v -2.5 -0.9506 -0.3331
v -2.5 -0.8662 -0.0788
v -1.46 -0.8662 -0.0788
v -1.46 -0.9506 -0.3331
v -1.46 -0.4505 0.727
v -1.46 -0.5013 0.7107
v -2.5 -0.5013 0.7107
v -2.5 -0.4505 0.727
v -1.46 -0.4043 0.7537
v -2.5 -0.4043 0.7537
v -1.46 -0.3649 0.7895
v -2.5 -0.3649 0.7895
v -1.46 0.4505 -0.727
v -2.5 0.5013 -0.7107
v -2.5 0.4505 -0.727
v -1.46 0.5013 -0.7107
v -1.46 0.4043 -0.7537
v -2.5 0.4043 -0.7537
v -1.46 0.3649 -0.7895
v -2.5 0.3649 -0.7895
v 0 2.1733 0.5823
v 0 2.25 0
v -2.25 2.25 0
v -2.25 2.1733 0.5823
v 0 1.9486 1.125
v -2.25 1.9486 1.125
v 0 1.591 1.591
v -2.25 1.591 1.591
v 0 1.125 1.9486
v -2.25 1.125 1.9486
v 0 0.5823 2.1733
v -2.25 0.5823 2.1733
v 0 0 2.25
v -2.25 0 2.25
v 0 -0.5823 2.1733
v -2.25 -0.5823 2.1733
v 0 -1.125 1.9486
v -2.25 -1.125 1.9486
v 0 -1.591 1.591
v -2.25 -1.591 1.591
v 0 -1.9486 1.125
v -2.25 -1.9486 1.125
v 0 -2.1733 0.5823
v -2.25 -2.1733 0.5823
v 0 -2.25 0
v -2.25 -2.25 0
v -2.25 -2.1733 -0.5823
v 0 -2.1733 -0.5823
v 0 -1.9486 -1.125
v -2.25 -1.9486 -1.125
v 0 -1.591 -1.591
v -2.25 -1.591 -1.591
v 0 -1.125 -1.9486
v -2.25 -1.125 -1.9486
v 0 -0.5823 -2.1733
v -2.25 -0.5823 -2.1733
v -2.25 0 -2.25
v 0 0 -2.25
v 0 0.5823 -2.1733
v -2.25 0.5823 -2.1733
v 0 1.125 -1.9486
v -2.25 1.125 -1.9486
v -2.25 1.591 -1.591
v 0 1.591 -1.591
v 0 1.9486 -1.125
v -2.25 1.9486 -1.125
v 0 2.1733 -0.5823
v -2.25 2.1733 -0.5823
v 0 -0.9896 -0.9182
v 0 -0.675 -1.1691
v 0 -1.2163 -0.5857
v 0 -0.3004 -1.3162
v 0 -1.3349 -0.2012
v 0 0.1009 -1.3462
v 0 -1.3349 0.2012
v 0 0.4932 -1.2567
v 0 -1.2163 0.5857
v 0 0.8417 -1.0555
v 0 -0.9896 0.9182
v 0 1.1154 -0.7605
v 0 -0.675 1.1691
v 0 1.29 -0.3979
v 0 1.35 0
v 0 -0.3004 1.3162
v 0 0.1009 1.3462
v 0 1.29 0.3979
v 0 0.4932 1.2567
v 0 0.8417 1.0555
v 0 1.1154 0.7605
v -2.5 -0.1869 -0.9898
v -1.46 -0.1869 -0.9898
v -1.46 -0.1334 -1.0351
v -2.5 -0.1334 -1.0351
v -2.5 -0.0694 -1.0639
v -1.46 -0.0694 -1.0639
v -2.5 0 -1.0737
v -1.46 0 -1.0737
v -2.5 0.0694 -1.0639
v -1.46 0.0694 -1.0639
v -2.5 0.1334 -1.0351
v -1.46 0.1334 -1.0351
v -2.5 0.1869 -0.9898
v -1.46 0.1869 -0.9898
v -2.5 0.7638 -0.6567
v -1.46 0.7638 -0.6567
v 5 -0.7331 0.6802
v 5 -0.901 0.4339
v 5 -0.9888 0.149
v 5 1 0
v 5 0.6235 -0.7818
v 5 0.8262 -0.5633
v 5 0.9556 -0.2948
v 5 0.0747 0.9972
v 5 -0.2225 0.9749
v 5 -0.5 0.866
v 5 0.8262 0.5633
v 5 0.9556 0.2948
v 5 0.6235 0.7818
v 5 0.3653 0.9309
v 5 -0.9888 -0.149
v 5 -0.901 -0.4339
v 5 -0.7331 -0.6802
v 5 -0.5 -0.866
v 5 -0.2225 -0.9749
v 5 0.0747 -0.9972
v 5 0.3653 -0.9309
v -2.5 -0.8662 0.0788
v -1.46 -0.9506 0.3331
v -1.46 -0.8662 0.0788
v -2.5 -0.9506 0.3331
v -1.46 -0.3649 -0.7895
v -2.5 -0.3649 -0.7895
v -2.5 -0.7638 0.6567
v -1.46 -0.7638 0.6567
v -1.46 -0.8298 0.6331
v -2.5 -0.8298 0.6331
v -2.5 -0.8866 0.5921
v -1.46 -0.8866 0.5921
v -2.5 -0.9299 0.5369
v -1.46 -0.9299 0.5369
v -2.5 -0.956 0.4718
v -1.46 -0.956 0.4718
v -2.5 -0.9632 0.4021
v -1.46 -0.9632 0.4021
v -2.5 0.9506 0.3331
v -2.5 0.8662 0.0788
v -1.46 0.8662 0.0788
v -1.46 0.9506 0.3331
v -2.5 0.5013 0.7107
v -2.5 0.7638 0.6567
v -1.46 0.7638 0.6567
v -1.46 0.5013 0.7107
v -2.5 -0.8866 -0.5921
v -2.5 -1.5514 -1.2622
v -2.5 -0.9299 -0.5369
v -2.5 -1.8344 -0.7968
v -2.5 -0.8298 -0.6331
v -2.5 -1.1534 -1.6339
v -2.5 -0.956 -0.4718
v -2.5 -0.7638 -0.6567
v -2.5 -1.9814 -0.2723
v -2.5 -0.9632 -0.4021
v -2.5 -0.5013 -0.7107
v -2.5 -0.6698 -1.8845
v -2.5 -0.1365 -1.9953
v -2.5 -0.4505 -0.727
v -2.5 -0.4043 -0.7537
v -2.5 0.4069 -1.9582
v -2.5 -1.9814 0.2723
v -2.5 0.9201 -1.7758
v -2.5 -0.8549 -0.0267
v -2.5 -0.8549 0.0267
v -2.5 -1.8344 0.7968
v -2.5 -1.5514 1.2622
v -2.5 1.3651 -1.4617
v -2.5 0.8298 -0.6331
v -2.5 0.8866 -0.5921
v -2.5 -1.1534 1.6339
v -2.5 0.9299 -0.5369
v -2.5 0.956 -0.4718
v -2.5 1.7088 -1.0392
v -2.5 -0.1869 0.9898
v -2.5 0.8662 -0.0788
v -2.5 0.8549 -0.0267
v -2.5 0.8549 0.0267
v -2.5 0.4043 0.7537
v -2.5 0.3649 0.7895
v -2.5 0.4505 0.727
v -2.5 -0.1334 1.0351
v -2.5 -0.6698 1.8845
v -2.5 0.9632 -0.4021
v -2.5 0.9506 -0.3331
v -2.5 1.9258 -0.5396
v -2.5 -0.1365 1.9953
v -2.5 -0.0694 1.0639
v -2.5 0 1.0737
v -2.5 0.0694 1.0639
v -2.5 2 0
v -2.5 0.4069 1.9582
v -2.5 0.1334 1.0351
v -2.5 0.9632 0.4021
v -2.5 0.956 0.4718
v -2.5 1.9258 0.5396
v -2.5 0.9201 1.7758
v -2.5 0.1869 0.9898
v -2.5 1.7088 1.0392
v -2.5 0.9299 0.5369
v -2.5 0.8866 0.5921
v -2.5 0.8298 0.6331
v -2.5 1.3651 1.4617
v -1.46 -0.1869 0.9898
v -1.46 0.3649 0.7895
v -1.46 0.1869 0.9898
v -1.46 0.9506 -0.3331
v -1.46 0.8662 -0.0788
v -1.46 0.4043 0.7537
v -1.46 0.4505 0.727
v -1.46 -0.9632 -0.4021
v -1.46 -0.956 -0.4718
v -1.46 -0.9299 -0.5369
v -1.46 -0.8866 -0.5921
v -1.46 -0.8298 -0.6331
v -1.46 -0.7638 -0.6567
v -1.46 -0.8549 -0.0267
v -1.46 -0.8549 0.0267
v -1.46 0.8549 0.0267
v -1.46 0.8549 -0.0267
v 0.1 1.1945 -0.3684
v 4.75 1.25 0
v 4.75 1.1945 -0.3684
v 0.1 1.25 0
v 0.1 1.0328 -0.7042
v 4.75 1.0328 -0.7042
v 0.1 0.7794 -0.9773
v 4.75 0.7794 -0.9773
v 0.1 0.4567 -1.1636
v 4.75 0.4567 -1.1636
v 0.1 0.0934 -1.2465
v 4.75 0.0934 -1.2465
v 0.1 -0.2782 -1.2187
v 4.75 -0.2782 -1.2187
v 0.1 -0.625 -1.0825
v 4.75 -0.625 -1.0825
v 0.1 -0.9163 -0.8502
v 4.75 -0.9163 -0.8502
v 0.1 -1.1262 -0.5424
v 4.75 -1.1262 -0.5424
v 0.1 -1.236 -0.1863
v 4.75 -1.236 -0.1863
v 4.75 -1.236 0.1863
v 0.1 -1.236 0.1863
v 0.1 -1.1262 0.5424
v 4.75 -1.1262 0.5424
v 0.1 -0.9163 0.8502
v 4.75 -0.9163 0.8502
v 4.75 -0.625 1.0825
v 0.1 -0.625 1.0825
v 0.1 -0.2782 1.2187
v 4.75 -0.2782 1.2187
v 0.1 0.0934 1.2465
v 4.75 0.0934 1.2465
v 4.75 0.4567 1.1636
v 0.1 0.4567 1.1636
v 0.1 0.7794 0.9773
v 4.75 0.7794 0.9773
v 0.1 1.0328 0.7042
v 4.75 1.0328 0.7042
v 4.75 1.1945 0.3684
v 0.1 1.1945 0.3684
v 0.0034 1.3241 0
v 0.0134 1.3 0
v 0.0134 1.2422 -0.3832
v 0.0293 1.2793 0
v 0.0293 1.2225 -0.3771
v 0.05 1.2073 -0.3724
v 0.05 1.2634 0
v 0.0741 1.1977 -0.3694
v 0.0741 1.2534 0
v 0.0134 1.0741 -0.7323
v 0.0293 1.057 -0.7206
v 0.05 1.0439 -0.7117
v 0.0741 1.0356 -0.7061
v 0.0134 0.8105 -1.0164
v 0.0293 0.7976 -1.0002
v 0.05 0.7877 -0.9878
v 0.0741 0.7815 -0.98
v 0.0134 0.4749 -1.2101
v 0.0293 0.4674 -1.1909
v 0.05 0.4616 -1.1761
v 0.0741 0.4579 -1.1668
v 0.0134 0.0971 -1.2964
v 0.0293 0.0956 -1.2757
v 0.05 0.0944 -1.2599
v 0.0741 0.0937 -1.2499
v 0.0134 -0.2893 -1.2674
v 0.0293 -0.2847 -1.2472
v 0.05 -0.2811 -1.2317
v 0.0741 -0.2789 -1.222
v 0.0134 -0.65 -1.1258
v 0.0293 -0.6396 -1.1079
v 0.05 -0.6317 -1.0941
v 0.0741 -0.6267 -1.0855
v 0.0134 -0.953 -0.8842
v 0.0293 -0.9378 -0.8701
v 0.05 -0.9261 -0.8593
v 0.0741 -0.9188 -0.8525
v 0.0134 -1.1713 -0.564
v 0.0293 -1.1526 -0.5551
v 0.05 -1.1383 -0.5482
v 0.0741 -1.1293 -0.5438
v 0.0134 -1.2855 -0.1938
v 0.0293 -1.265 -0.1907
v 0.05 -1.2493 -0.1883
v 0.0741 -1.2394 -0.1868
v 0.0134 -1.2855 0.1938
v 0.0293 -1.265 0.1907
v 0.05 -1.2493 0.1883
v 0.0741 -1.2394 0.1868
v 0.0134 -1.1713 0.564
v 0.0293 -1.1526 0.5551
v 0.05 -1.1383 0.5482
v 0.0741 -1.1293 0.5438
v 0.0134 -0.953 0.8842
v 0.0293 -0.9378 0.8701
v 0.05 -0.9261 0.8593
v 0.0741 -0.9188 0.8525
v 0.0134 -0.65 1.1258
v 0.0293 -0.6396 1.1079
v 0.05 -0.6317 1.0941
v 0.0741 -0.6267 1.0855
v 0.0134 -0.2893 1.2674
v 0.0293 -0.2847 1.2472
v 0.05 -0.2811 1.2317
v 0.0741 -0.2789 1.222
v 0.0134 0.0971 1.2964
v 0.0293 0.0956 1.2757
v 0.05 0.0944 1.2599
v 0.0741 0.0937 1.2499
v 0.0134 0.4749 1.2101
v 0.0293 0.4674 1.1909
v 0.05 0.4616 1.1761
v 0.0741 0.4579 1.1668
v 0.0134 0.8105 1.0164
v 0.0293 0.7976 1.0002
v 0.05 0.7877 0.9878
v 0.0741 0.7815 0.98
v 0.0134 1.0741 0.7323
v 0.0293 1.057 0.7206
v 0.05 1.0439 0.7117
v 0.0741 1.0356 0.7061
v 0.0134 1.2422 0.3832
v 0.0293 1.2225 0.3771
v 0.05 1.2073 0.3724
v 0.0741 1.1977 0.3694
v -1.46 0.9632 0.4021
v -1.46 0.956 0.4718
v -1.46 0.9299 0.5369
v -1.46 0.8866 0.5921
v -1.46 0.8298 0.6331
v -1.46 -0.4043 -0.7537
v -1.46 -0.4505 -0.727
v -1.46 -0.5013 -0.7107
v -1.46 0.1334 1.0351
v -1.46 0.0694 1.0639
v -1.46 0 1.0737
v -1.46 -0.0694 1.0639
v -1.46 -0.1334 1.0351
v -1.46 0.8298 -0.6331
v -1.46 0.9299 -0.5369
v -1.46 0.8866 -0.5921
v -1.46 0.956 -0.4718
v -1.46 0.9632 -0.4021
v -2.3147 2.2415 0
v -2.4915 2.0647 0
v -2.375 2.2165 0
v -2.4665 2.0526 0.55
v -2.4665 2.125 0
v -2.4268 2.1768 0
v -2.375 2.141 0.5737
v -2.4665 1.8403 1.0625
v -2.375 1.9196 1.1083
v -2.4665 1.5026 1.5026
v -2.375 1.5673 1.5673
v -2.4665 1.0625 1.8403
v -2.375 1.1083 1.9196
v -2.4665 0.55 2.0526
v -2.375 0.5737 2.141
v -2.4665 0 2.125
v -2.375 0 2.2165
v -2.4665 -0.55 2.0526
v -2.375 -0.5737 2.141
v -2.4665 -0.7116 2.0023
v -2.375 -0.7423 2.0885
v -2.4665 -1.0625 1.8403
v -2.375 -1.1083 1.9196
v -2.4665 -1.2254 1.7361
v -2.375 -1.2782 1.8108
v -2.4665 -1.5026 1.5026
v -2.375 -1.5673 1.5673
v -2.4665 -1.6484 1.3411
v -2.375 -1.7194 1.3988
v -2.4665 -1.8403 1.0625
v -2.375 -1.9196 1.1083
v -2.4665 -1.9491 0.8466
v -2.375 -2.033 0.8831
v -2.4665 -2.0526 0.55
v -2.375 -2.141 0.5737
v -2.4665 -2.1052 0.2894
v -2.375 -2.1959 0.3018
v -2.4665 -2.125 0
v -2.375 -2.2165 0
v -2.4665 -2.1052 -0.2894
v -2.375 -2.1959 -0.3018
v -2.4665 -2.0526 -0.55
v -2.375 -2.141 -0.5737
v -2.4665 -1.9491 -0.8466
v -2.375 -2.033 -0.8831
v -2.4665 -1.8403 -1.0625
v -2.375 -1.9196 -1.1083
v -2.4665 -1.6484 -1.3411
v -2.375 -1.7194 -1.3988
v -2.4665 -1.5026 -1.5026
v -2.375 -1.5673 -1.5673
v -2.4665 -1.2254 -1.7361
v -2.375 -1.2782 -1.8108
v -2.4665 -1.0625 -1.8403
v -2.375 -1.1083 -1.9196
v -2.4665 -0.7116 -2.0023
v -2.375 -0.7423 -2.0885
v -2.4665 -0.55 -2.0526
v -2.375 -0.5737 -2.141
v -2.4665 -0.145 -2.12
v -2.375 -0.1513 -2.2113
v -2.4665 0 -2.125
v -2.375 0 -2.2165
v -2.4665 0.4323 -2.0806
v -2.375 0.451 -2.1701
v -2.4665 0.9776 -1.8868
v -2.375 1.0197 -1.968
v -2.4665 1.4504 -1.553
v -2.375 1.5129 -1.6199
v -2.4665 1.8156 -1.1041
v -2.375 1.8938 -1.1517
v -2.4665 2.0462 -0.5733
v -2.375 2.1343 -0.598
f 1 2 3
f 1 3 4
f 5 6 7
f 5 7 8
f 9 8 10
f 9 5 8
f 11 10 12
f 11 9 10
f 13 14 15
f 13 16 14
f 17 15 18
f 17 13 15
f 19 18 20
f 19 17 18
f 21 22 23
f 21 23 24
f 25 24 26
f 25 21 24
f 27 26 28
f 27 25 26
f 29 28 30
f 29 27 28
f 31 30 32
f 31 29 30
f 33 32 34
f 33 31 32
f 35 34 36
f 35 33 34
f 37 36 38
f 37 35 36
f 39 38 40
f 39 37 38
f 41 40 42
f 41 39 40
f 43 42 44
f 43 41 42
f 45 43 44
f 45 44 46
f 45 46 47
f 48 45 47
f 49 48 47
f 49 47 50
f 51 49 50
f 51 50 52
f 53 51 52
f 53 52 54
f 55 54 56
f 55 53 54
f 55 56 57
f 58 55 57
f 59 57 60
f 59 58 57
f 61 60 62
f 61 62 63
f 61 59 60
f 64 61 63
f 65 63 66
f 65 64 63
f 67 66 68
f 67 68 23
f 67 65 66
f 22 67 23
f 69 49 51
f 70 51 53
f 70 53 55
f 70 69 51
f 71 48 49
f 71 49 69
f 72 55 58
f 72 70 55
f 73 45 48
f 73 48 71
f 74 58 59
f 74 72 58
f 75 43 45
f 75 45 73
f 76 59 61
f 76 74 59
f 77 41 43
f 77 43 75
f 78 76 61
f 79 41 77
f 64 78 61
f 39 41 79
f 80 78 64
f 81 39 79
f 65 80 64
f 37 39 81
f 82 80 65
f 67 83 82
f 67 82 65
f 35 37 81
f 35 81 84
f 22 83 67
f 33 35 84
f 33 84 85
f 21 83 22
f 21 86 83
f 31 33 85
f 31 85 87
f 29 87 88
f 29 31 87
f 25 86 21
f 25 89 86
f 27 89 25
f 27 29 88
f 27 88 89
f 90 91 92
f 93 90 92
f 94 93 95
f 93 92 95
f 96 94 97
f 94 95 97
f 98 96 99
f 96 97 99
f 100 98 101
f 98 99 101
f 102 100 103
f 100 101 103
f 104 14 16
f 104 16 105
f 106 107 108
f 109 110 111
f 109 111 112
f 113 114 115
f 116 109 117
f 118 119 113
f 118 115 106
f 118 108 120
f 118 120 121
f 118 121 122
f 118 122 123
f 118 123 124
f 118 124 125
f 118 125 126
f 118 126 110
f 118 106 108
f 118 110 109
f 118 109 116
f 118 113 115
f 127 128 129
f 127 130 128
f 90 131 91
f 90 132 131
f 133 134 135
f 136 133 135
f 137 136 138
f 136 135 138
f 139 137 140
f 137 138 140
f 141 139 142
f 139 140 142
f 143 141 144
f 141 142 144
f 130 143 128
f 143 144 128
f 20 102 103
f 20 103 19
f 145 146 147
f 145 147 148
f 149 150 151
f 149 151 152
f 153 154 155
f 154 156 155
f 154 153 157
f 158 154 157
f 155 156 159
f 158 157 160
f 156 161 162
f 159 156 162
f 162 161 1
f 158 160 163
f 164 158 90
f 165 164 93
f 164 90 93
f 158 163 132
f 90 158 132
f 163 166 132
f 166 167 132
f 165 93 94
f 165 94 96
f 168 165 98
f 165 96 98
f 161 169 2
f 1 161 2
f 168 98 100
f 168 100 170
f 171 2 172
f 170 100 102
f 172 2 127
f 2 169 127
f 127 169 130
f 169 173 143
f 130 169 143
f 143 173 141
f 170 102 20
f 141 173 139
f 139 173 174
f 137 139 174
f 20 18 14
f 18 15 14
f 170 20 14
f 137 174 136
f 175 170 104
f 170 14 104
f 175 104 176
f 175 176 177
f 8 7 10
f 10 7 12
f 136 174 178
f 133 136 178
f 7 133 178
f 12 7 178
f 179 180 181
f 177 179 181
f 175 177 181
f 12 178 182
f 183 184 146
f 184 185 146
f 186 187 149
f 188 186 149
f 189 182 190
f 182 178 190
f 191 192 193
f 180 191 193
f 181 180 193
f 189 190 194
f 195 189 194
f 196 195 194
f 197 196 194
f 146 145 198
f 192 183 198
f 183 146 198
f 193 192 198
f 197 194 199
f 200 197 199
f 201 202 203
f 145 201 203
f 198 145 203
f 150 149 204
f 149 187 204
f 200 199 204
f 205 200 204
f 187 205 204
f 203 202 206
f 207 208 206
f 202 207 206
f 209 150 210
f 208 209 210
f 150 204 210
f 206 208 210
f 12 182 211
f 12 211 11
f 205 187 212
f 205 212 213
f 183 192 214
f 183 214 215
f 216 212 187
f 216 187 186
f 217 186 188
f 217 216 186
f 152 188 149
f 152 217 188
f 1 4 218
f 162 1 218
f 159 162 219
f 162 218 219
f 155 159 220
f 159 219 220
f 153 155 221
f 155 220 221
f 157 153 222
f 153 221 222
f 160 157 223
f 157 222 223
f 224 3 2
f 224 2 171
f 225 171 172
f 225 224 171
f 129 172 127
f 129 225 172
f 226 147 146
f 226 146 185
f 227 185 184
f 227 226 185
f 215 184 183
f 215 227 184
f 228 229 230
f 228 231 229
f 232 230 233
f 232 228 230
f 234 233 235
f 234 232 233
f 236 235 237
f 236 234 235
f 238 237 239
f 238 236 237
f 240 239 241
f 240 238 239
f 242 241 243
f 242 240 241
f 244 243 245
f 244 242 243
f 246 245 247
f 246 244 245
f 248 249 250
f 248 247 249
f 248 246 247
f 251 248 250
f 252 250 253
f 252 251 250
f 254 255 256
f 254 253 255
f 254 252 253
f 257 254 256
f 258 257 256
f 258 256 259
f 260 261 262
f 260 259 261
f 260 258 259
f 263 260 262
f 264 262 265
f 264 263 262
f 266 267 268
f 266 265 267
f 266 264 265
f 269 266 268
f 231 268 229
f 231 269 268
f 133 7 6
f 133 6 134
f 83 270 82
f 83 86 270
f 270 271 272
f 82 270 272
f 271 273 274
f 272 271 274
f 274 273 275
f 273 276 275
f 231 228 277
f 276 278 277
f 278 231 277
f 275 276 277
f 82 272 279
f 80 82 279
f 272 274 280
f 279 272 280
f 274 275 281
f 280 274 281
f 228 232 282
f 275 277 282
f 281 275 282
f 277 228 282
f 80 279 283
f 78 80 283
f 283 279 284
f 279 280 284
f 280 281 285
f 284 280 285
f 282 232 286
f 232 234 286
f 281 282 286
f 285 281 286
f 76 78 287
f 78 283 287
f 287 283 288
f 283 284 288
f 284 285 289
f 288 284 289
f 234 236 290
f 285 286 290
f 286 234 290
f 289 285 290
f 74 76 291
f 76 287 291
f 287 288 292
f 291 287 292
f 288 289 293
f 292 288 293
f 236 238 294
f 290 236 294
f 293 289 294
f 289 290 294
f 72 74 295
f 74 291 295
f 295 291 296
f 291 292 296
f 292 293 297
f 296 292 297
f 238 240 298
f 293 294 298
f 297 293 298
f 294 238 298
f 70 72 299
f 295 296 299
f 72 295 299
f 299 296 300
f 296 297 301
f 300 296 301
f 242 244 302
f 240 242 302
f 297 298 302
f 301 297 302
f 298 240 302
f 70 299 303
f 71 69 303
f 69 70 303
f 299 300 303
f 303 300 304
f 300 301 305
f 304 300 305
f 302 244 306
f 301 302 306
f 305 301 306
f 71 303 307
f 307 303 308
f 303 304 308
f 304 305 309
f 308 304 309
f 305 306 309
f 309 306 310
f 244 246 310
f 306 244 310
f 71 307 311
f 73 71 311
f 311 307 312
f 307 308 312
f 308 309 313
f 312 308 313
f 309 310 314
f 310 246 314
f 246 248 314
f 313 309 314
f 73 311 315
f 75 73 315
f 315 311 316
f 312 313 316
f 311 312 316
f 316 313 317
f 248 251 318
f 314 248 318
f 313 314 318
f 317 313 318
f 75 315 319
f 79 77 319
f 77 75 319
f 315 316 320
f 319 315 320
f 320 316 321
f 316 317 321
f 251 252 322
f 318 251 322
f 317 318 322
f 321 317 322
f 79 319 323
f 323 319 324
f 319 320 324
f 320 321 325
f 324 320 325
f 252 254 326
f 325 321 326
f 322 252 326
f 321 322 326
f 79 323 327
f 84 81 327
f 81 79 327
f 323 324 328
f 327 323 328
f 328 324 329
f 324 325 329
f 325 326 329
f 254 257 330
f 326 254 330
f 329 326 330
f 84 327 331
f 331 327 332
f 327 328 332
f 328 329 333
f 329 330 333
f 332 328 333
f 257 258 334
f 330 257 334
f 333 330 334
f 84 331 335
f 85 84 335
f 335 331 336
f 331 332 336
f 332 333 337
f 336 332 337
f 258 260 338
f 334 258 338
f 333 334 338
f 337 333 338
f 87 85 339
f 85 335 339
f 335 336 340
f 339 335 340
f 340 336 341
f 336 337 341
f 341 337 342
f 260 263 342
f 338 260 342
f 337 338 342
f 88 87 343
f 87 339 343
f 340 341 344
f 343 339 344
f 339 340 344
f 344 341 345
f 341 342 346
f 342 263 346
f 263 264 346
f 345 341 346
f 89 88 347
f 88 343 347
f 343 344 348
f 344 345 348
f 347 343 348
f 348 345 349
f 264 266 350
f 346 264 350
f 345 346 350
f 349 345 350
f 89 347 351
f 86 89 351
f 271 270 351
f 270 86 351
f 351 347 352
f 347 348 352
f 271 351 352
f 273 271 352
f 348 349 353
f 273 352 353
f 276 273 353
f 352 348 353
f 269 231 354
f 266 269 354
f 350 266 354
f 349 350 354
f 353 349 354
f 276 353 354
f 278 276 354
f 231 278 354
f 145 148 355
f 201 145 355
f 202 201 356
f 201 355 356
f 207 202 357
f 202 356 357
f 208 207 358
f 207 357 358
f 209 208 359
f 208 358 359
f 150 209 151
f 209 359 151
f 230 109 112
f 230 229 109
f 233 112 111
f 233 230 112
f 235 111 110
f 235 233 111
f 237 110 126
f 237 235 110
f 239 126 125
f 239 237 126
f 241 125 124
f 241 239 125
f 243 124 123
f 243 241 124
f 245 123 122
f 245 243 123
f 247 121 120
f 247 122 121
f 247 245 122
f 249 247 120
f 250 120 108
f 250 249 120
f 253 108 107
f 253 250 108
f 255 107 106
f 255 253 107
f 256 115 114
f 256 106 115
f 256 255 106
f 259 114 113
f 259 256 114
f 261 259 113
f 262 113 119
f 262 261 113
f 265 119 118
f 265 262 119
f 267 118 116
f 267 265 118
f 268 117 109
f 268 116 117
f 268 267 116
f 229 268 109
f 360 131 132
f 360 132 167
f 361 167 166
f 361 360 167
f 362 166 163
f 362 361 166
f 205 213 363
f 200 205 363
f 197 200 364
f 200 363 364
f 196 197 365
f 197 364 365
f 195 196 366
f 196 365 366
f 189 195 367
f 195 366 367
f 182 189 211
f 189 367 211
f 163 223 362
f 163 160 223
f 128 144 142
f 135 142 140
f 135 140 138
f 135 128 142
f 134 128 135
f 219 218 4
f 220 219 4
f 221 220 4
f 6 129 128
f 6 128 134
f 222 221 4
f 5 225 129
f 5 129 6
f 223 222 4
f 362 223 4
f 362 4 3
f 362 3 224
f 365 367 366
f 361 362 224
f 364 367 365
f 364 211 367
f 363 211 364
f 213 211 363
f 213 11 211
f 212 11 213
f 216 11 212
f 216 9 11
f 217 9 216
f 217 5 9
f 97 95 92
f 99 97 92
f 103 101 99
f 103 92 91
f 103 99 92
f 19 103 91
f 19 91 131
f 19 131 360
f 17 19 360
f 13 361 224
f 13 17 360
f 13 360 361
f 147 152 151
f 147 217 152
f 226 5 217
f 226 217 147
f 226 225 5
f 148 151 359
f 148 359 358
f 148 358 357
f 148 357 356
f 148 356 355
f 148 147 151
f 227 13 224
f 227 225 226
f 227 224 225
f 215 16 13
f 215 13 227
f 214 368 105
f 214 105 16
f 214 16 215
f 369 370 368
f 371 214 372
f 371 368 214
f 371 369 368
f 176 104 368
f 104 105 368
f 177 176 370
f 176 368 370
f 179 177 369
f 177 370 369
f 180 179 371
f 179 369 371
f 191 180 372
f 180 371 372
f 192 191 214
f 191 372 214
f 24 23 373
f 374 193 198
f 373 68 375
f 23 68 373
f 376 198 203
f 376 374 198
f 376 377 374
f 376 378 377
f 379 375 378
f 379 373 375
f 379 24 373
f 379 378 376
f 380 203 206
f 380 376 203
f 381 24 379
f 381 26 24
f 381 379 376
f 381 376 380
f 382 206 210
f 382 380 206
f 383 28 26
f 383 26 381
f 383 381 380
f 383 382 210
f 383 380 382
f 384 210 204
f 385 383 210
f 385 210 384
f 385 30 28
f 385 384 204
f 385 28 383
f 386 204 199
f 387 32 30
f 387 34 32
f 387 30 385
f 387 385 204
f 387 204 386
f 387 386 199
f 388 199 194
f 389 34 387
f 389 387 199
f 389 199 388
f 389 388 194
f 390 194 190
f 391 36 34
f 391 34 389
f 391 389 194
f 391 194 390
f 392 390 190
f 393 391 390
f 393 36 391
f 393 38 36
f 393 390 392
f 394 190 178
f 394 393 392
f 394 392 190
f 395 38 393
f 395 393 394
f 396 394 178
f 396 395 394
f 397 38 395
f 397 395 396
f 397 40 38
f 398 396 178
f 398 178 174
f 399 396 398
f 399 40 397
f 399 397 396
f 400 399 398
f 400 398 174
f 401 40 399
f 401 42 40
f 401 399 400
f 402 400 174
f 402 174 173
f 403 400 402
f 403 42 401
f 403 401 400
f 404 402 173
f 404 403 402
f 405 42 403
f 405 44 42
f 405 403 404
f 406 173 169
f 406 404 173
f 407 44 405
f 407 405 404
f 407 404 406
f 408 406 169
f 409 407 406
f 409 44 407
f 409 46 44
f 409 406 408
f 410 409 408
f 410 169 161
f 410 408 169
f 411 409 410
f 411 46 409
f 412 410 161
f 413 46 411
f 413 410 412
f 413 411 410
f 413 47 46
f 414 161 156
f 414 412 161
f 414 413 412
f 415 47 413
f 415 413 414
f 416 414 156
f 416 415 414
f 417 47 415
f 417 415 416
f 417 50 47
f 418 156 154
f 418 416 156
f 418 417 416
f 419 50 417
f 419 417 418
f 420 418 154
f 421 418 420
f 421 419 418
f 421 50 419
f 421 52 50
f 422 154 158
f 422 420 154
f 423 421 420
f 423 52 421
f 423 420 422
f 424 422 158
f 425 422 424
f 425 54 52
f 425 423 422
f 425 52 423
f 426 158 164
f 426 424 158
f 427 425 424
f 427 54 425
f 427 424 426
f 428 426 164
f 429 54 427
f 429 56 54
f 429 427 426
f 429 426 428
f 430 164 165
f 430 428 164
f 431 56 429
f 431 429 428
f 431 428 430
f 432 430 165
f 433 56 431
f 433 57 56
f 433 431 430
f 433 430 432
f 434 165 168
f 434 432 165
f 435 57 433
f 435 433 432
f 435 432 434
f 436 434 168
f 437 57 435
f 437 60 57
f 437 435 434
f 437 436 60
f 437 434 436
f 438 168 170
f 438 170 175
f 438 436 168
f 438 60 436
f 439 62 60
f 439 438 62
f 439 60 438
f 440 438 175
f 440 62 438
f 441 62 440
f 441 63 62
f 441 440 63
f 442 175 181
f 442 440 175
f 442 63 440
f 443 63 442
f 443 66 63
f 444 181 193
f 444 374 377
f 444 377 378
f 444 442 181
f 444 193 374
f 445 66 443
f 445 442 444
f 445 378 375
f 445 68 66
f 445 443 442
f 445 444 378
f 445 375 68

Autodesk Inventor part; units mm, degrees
ref_plane "YZ Plane" through (0, 0, 0) normal (1, 0, 0) x (0, 1, 0)
ref_plane "XZ Plane" through (0, 0, 0) normal (0, 1, 0) x (-1, 0, 0)
ref_plane "XY Plane" through (0, 0, 0) normal (0, 0, 1) x (1, 0, 0)
sketch "Sketch1" plane through (0, 0, 0) normal (0, 0, 1) x (1, 0, 0)
  line L0 (0, 0) -> (5, 0)
  line L1 (5, 0) -> (5, 1.25)
  line L2 (5, 1.25) -> (0, 1.25)
  line L3 (0, 1.25) -> (0, 0)
  line L4 (0, 0) -> (-2.5, 0)
  line L5 (-2.5, 0) -> (-2.5, 2.25)
  line L6 (-2.5, 2.25) -> (0, 2.25)
  line L7 (0, 2.25) -> (0, 0)
  dimension "d0" = 2.5
  dimension "d1" = 4.5
  dimension "d2" = 2.5
  dimension "d3" = 5
revolve "Revolution1" add sketch "Sketch1" angle 360 about axis through (0, 0, 0) along (1, 0, 0)
thread "Thread1" size "M2.5x0.45" class "6g" standard "ISO Metric profile" length 5
sketch "Sketch2" plane through (-2.5, 0, 0) normal (-1, 0, 0) x (0, 0, 1)
  circle A0 centre (0, 0) radius 1.2 construction
  circle A1 centre (0, 0) radius 0.84 construction
  line L0 (-0.7275, -0.42) -> (-1.2, 0)
  line L1 (0, 0) -> (-0.7275, -0.42)
  line L2 (0, 0) -> (-0.7275, 0.42)
  line L3 (-3.15, 0) -> (3.15, 0) construction
  line L4 (-1.2, 0) -> (-0.7275, 0.42)
  dimension "d21" = 2.4
  dimension "d19" = 60
  dimension "d20" = 30
  dimension "d26" = 1.68
extrude "Extrusion1" cut sketch "Sketch2" against normal blind 1.04
pattern_circular "Circular Pattern1" count 6 over 360 about axis through (-2.5, 0, 0) along (1, 0, 0) of "Extrusion1"
fillet "Fillet2" radius 0.25 6 edges at (-1.98, 1.0392, -0.6) (-1.98, 1.0392, 0.6) (-1.98, 0, 1.2) (-1.98, -1.0392, 0.6) (-1.98, -1.0392, -0.6) (-1.98, 0, -1.2)
fillet "Fillet3" radius 0.25 6 edges at (-1.98, 0.84, 0) (-1.98, 0.42, -0.7275) (-1.98, -0.42, -0.7275) (-1.98, -0.84, 0) (-1.98, -0.42, 0.7275) (-1.98, 0.42, 0.7275)
fillet "Fillet4" radius 0.25 1 edges at (-2.5, -2.25, 0)
fillet "Fillet5" radius 0.1 1 edges at (0, -1.25, 0)
chamfer "Chamfer2" distance 0.25 angle 45 1 edges at (5, -1.25, 0)
equation "\"d0\" = d"
equation "\"d1\" = dk"
equation "\"d2\" = k"
equation "\"d3\" = l_"
equation "\"d6\" = b"
equation "\"d21\" = A_"
equation "\"d20\" = 0.5 * d19"
equation "\"d26\" = 0.7 * d21"
equation "\"d27\" = t"
equation "\"d32\" = v"
equation "\"d33\" = v"
equation "\"d34\" = v"
equation "\"d35\" = r"
equation "\"d36\" = v"
equation "\"A_\" = 2.4"
equation "\"d\" = 2.5"
equation "\"dk\" = 4.5"
equation "\"k\" = 2.5"
equation "\"l_\" = 5"
equation "\"lg\" = 0"
equation "\"t\" = 1.04"
equation "\"w\" = 0.55"
equation "\"v\" = 0.25"
equation "\"r\" = 0.1"
equation "\"da\" = 2.6"
equation "\"p\" = 0.45"
equation "\"ds_\" = d"
equation "\"GAL\" = 0.61345 * p"
equation "\"ls\" = 0"
equation "\"b\" = l_ - lg"
properties part number "Inbusschraube mit Innenrund ISO 14579 - M2,5x5-8.8" material "Stahl"
